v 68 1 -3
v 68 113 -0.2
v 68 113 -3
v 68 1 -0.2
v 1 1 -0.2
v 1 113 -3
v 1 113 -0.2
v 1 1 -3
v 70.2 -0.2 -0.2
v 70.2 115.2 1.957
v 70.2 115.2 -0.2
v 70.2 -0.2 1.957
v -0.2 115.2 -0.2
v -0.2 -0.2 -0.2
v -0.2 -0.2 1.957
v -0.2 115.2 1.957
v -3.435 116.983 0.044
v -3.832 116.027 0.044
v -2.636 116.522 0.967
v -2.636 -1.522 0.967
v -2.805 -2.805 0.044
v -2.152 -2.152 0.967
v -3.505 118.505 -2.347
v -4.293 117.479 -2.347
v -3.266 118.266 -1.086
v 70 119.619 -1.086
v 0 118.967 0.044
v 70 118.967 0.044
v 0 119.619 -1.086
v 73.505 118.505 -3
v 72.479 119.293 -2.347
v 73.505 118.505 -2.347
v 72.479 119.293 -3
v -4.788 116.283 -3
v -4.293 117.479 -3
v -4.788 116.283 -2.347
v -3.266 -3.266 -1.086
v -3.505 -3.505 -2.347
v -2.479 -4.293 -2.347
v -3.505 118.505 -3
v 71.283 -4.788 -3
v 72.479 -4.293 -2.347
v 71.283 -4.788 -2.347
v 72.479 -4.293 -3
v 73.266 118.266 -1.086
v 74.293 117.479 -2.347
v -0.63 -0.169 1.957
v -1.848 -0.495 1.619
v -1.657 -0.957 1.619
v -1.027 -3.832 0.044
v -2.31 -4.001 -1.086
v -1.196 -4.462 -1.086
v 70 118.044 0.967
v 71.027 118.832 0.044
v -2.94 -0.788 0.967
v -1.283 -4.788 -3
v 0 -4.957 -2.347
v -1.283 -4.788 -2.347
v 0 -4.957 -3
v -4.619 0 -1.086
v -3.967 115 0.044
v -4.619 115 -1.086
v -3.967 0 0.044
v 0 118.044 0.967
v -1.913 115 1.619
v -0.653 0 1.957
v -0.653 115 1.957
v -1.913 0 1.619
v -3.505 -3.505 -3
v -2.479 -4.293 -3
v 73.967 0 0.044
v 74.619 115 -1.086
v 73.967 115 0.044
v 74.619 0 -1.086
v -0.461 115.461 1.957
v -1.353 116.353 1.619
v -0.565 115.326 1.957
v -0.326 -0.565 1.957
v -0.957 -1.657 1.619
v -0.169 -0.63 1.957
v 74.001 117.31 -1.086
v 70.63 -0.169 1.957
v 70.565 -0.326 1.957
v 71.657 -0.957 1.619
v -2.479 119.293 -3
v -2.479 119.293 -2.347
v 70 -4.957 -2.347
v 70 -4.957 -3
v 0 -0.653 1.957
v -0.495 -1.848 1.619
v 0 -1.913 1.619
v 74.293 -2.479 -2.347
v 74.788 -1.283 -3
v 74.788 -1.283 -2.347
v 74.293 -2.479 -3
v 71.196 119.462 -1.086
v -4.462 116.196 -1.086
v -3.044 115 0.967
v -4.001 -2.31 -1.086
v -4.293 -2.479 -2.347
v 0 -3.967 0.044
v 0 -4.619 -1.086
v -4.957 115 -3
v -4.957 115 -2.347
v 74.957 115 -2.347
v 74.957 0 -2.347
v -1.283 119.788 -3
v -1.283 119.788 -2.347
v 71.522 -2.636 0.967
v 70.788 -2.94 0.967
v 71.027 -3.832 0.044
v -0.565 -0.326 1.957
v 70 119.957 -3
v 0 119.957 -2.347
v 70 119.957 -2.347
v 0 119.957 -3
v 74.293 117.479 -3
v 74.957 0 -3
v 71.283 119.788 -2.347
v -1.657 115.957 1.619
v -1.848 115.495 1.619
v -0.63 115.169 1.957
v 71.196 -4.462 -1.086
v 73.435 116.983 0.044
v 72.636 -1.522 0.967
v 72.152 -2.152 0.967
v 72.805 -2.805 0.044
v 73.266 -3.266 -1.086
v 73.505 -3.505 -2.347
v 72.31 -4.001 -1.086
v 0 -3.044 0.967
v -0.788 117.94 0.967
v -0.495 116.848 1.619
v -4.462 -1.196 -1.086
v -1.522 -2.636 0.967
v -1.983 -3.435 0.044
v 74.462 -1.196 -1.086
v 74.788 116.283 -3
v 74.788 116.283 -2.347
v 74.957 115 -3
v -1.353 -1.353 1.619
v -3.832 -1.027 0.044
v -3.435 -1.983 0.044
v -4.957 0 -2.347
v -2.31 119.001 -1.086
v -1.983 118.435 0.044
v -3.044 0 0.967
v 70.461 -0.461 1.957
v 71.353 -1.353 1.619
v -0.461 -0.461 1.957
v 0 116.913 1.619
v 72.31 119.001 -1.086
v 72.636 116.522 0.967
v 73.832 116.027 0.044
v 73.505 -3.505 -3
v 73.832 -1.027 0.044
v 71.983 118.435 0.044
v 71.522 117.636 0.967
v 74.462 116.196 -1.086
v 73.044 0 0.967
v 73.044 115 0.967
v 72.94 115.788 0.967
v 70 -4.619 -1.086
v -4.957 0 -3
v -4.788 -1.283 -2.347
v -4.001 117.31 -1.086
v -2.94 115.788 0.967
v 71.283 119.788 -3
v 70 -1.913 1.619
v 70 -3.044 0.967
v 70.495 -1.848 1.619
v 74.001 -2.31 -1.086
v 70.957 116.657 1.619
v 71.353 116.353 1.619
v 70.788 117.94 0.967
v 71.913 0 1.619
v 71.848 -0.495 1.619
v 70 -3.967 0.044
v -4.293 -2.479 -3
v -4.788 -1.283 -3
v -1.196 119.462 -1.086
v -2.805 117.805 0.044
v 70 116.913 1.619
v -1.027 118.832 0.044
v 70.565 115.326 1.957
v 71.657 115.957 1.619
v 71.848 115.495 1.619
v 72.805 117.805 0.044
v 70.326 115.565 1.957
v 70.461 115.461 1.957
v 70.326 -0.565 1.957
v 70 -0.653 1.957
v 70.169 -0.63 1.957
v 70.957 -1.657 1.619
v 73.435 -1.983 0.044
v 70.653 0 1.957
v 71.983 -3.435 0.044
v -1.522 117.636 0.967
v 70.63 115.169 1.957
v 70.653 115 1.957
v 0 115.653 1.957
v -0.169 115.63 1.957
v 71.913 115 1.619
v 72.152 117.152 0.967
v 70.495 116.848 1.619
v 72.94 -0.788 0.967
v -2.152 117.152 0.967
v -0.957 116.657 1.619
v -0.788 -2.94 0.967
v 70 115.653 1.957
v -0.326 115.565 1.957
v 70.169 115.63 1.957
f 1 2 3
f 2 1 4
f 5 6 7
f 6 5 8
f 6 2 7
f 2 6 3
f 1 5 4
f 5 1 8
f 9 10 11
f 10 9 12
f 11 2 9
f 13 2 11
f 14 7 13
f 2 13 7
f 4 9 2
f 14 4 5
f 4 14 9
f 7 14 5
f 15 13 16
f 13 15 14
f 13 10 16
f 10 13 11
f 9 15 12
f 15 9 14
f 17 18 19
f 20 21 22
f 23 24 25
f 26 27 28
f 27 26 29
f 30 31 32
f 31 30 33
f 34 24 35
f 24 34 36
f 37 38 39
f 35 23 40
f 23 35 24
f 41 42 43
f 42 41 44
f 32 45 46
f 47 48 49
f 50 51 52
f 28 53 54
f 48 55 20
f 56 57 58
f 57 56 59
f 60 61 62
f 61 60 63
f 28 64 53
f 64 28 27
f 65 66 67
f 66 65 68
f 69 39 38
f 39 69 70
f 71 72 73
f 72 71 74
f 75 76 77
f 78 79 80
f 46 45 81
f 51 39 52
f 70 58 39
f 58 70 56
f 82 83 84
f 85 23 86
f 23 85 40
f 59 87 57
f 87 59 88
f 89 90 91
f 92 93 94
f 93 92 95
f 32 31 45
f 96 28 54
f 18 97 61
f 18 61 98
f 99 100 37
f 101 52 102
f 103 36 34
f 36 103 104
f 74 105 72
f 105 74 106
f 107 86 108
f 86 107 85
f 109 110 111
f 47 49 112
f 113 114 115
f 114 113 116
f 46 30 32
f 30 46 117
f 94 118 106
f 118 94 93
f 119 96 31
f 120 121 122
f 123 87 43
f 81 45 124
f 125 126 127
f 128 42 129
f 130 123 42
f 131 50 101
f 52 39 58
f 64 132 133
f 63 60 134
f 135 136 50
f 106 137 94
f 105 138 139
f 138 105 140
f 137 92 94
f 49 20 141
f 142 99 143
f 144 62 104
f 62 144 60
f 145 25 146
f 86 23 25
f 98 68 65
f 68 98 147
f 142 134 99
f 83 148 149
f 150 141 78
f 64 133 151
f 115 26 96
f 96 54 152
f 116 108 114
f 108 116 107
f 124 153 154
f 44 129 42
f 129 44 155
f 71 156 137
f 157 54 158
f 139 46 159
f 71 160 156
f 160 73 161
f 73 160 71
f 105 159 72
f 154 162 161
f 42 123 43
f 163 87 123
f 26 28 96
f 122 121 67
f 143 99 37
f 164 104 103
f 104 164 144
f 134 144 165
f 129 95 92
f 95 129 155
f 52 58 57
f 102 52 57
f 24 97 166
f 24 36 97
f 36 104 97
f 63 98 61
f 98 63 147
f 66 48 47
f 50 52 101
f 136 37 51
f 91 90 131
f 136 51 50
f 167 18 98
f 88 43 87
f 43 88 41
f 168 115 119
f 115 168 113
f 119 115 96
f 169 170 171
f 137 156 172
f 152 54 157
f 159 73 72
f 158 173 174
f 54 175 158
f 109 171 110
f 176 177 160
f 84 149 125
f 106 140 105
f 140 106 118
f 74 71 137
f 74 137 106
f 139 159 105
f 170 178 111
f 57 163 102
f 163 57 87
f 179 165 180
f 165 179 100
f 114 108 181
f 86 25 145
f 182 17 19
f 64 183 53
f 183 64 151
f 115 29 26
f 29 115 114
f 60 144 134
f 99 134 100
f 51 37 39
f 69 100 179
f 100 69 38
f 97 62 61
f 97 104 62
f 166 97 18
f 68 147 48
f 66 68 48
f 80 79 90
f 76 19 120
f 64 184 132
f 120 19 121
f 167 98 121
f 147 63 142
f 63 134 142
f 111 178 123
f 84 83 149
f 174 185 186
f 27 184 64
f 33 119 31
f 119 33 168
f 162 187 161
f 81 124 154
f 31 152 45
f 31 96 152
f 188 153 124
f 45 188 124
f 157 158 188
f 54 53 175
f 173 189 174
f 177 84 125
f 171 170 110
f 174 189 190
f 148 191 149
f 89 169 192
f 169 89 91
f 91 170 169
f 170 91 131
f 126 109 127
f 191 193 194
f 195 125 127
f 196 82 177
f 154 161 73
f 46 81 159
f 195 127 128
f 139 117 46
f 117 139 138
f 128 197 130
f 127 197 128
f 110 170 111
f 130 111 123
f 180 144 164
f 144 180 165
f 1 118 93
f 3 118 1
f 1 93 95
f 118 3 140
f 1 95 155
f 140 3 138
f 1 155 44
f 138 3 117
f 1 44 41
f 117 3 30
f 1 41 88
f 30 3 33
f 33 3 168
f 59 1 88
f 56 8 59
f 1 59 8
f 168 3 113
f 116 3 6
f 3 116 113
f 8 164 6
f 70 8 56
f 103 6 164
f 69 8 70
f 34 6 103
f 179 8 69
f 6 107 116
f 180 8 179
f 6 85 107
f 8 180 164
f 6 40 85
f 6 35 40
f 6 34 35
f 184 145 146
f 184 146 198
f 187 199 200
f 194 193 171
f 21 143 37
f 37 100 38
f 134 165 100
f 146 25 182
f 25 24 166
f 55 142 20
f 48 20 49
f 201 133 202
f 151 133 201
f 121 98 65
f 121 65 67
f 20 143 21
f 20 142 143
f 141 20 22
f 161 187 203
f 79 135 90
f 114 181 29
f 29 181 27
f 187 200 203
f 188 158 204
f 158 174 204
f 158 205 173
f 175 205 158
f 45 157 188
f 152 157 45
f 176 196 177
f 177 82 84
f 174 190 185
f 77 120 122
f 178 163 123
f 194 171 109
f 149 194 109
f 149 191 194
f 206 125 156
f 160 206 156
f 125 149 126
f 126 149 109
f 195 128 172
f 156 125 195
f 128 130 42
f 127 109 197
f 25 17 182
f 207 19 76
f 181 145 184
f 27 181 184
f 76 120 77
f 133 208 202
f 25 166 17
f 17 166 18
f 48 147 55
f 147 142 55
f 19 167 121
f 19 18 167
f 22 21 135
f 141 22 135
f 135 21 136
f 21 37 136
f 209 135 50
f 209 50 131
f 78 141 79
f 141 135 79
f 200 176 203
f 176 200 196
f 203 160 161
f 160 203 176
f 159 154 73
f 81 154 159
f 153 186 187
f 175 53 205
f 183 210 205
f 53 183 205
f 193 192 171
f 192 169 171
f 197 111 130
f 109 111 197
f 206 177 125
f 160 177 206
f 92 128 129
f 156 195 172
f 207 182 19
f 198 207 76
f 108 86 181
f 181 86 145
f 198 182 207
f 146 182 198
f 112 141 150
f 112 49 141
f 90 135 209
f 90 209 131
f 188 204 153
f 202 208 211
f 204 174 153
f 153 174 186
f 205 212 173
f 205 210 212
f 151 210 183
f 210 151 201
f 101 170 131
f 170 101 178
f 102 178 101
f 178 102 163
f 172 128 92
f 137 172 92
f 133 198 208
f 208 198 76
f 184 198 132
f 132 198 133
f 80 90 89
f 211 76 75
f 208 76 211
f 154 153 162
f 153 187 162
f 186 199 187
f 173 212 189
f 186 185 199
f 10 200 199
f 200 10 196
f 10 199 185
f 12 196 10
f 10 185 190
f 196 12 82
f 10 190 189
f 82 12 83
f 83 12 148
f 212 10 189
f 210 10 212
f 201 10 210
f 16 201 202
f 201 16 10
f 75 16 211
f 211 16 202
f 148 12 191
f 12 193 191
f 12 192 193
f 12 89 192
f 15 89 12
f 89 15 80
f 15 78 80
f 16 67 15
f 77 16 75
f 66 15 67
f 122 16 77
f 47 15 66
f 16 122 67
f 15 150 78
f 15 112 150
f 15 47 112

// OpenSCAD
translate(v = [0, 0, -3]) {
	difference() {
		minkowski() {
			cube(size = [70, 115, 0.0001000000]);
			difference() {
				sphere($fn = 24, r = 5);
				translate(v = [-5, -5, -5]) {
					cube(size = [10, 10, 5]);
				}
			}
		}
		union() {
			translate(v = [1, 1, -1]) {
				cube(size = [67, 112, 7]);
			}
			translate(v = [-0.2000000000, -0.2000000000, 2.8000000000]) {
				cube(size = [70.4000000000, 115.4000000000, 7]);
			}
		}
	}
}
